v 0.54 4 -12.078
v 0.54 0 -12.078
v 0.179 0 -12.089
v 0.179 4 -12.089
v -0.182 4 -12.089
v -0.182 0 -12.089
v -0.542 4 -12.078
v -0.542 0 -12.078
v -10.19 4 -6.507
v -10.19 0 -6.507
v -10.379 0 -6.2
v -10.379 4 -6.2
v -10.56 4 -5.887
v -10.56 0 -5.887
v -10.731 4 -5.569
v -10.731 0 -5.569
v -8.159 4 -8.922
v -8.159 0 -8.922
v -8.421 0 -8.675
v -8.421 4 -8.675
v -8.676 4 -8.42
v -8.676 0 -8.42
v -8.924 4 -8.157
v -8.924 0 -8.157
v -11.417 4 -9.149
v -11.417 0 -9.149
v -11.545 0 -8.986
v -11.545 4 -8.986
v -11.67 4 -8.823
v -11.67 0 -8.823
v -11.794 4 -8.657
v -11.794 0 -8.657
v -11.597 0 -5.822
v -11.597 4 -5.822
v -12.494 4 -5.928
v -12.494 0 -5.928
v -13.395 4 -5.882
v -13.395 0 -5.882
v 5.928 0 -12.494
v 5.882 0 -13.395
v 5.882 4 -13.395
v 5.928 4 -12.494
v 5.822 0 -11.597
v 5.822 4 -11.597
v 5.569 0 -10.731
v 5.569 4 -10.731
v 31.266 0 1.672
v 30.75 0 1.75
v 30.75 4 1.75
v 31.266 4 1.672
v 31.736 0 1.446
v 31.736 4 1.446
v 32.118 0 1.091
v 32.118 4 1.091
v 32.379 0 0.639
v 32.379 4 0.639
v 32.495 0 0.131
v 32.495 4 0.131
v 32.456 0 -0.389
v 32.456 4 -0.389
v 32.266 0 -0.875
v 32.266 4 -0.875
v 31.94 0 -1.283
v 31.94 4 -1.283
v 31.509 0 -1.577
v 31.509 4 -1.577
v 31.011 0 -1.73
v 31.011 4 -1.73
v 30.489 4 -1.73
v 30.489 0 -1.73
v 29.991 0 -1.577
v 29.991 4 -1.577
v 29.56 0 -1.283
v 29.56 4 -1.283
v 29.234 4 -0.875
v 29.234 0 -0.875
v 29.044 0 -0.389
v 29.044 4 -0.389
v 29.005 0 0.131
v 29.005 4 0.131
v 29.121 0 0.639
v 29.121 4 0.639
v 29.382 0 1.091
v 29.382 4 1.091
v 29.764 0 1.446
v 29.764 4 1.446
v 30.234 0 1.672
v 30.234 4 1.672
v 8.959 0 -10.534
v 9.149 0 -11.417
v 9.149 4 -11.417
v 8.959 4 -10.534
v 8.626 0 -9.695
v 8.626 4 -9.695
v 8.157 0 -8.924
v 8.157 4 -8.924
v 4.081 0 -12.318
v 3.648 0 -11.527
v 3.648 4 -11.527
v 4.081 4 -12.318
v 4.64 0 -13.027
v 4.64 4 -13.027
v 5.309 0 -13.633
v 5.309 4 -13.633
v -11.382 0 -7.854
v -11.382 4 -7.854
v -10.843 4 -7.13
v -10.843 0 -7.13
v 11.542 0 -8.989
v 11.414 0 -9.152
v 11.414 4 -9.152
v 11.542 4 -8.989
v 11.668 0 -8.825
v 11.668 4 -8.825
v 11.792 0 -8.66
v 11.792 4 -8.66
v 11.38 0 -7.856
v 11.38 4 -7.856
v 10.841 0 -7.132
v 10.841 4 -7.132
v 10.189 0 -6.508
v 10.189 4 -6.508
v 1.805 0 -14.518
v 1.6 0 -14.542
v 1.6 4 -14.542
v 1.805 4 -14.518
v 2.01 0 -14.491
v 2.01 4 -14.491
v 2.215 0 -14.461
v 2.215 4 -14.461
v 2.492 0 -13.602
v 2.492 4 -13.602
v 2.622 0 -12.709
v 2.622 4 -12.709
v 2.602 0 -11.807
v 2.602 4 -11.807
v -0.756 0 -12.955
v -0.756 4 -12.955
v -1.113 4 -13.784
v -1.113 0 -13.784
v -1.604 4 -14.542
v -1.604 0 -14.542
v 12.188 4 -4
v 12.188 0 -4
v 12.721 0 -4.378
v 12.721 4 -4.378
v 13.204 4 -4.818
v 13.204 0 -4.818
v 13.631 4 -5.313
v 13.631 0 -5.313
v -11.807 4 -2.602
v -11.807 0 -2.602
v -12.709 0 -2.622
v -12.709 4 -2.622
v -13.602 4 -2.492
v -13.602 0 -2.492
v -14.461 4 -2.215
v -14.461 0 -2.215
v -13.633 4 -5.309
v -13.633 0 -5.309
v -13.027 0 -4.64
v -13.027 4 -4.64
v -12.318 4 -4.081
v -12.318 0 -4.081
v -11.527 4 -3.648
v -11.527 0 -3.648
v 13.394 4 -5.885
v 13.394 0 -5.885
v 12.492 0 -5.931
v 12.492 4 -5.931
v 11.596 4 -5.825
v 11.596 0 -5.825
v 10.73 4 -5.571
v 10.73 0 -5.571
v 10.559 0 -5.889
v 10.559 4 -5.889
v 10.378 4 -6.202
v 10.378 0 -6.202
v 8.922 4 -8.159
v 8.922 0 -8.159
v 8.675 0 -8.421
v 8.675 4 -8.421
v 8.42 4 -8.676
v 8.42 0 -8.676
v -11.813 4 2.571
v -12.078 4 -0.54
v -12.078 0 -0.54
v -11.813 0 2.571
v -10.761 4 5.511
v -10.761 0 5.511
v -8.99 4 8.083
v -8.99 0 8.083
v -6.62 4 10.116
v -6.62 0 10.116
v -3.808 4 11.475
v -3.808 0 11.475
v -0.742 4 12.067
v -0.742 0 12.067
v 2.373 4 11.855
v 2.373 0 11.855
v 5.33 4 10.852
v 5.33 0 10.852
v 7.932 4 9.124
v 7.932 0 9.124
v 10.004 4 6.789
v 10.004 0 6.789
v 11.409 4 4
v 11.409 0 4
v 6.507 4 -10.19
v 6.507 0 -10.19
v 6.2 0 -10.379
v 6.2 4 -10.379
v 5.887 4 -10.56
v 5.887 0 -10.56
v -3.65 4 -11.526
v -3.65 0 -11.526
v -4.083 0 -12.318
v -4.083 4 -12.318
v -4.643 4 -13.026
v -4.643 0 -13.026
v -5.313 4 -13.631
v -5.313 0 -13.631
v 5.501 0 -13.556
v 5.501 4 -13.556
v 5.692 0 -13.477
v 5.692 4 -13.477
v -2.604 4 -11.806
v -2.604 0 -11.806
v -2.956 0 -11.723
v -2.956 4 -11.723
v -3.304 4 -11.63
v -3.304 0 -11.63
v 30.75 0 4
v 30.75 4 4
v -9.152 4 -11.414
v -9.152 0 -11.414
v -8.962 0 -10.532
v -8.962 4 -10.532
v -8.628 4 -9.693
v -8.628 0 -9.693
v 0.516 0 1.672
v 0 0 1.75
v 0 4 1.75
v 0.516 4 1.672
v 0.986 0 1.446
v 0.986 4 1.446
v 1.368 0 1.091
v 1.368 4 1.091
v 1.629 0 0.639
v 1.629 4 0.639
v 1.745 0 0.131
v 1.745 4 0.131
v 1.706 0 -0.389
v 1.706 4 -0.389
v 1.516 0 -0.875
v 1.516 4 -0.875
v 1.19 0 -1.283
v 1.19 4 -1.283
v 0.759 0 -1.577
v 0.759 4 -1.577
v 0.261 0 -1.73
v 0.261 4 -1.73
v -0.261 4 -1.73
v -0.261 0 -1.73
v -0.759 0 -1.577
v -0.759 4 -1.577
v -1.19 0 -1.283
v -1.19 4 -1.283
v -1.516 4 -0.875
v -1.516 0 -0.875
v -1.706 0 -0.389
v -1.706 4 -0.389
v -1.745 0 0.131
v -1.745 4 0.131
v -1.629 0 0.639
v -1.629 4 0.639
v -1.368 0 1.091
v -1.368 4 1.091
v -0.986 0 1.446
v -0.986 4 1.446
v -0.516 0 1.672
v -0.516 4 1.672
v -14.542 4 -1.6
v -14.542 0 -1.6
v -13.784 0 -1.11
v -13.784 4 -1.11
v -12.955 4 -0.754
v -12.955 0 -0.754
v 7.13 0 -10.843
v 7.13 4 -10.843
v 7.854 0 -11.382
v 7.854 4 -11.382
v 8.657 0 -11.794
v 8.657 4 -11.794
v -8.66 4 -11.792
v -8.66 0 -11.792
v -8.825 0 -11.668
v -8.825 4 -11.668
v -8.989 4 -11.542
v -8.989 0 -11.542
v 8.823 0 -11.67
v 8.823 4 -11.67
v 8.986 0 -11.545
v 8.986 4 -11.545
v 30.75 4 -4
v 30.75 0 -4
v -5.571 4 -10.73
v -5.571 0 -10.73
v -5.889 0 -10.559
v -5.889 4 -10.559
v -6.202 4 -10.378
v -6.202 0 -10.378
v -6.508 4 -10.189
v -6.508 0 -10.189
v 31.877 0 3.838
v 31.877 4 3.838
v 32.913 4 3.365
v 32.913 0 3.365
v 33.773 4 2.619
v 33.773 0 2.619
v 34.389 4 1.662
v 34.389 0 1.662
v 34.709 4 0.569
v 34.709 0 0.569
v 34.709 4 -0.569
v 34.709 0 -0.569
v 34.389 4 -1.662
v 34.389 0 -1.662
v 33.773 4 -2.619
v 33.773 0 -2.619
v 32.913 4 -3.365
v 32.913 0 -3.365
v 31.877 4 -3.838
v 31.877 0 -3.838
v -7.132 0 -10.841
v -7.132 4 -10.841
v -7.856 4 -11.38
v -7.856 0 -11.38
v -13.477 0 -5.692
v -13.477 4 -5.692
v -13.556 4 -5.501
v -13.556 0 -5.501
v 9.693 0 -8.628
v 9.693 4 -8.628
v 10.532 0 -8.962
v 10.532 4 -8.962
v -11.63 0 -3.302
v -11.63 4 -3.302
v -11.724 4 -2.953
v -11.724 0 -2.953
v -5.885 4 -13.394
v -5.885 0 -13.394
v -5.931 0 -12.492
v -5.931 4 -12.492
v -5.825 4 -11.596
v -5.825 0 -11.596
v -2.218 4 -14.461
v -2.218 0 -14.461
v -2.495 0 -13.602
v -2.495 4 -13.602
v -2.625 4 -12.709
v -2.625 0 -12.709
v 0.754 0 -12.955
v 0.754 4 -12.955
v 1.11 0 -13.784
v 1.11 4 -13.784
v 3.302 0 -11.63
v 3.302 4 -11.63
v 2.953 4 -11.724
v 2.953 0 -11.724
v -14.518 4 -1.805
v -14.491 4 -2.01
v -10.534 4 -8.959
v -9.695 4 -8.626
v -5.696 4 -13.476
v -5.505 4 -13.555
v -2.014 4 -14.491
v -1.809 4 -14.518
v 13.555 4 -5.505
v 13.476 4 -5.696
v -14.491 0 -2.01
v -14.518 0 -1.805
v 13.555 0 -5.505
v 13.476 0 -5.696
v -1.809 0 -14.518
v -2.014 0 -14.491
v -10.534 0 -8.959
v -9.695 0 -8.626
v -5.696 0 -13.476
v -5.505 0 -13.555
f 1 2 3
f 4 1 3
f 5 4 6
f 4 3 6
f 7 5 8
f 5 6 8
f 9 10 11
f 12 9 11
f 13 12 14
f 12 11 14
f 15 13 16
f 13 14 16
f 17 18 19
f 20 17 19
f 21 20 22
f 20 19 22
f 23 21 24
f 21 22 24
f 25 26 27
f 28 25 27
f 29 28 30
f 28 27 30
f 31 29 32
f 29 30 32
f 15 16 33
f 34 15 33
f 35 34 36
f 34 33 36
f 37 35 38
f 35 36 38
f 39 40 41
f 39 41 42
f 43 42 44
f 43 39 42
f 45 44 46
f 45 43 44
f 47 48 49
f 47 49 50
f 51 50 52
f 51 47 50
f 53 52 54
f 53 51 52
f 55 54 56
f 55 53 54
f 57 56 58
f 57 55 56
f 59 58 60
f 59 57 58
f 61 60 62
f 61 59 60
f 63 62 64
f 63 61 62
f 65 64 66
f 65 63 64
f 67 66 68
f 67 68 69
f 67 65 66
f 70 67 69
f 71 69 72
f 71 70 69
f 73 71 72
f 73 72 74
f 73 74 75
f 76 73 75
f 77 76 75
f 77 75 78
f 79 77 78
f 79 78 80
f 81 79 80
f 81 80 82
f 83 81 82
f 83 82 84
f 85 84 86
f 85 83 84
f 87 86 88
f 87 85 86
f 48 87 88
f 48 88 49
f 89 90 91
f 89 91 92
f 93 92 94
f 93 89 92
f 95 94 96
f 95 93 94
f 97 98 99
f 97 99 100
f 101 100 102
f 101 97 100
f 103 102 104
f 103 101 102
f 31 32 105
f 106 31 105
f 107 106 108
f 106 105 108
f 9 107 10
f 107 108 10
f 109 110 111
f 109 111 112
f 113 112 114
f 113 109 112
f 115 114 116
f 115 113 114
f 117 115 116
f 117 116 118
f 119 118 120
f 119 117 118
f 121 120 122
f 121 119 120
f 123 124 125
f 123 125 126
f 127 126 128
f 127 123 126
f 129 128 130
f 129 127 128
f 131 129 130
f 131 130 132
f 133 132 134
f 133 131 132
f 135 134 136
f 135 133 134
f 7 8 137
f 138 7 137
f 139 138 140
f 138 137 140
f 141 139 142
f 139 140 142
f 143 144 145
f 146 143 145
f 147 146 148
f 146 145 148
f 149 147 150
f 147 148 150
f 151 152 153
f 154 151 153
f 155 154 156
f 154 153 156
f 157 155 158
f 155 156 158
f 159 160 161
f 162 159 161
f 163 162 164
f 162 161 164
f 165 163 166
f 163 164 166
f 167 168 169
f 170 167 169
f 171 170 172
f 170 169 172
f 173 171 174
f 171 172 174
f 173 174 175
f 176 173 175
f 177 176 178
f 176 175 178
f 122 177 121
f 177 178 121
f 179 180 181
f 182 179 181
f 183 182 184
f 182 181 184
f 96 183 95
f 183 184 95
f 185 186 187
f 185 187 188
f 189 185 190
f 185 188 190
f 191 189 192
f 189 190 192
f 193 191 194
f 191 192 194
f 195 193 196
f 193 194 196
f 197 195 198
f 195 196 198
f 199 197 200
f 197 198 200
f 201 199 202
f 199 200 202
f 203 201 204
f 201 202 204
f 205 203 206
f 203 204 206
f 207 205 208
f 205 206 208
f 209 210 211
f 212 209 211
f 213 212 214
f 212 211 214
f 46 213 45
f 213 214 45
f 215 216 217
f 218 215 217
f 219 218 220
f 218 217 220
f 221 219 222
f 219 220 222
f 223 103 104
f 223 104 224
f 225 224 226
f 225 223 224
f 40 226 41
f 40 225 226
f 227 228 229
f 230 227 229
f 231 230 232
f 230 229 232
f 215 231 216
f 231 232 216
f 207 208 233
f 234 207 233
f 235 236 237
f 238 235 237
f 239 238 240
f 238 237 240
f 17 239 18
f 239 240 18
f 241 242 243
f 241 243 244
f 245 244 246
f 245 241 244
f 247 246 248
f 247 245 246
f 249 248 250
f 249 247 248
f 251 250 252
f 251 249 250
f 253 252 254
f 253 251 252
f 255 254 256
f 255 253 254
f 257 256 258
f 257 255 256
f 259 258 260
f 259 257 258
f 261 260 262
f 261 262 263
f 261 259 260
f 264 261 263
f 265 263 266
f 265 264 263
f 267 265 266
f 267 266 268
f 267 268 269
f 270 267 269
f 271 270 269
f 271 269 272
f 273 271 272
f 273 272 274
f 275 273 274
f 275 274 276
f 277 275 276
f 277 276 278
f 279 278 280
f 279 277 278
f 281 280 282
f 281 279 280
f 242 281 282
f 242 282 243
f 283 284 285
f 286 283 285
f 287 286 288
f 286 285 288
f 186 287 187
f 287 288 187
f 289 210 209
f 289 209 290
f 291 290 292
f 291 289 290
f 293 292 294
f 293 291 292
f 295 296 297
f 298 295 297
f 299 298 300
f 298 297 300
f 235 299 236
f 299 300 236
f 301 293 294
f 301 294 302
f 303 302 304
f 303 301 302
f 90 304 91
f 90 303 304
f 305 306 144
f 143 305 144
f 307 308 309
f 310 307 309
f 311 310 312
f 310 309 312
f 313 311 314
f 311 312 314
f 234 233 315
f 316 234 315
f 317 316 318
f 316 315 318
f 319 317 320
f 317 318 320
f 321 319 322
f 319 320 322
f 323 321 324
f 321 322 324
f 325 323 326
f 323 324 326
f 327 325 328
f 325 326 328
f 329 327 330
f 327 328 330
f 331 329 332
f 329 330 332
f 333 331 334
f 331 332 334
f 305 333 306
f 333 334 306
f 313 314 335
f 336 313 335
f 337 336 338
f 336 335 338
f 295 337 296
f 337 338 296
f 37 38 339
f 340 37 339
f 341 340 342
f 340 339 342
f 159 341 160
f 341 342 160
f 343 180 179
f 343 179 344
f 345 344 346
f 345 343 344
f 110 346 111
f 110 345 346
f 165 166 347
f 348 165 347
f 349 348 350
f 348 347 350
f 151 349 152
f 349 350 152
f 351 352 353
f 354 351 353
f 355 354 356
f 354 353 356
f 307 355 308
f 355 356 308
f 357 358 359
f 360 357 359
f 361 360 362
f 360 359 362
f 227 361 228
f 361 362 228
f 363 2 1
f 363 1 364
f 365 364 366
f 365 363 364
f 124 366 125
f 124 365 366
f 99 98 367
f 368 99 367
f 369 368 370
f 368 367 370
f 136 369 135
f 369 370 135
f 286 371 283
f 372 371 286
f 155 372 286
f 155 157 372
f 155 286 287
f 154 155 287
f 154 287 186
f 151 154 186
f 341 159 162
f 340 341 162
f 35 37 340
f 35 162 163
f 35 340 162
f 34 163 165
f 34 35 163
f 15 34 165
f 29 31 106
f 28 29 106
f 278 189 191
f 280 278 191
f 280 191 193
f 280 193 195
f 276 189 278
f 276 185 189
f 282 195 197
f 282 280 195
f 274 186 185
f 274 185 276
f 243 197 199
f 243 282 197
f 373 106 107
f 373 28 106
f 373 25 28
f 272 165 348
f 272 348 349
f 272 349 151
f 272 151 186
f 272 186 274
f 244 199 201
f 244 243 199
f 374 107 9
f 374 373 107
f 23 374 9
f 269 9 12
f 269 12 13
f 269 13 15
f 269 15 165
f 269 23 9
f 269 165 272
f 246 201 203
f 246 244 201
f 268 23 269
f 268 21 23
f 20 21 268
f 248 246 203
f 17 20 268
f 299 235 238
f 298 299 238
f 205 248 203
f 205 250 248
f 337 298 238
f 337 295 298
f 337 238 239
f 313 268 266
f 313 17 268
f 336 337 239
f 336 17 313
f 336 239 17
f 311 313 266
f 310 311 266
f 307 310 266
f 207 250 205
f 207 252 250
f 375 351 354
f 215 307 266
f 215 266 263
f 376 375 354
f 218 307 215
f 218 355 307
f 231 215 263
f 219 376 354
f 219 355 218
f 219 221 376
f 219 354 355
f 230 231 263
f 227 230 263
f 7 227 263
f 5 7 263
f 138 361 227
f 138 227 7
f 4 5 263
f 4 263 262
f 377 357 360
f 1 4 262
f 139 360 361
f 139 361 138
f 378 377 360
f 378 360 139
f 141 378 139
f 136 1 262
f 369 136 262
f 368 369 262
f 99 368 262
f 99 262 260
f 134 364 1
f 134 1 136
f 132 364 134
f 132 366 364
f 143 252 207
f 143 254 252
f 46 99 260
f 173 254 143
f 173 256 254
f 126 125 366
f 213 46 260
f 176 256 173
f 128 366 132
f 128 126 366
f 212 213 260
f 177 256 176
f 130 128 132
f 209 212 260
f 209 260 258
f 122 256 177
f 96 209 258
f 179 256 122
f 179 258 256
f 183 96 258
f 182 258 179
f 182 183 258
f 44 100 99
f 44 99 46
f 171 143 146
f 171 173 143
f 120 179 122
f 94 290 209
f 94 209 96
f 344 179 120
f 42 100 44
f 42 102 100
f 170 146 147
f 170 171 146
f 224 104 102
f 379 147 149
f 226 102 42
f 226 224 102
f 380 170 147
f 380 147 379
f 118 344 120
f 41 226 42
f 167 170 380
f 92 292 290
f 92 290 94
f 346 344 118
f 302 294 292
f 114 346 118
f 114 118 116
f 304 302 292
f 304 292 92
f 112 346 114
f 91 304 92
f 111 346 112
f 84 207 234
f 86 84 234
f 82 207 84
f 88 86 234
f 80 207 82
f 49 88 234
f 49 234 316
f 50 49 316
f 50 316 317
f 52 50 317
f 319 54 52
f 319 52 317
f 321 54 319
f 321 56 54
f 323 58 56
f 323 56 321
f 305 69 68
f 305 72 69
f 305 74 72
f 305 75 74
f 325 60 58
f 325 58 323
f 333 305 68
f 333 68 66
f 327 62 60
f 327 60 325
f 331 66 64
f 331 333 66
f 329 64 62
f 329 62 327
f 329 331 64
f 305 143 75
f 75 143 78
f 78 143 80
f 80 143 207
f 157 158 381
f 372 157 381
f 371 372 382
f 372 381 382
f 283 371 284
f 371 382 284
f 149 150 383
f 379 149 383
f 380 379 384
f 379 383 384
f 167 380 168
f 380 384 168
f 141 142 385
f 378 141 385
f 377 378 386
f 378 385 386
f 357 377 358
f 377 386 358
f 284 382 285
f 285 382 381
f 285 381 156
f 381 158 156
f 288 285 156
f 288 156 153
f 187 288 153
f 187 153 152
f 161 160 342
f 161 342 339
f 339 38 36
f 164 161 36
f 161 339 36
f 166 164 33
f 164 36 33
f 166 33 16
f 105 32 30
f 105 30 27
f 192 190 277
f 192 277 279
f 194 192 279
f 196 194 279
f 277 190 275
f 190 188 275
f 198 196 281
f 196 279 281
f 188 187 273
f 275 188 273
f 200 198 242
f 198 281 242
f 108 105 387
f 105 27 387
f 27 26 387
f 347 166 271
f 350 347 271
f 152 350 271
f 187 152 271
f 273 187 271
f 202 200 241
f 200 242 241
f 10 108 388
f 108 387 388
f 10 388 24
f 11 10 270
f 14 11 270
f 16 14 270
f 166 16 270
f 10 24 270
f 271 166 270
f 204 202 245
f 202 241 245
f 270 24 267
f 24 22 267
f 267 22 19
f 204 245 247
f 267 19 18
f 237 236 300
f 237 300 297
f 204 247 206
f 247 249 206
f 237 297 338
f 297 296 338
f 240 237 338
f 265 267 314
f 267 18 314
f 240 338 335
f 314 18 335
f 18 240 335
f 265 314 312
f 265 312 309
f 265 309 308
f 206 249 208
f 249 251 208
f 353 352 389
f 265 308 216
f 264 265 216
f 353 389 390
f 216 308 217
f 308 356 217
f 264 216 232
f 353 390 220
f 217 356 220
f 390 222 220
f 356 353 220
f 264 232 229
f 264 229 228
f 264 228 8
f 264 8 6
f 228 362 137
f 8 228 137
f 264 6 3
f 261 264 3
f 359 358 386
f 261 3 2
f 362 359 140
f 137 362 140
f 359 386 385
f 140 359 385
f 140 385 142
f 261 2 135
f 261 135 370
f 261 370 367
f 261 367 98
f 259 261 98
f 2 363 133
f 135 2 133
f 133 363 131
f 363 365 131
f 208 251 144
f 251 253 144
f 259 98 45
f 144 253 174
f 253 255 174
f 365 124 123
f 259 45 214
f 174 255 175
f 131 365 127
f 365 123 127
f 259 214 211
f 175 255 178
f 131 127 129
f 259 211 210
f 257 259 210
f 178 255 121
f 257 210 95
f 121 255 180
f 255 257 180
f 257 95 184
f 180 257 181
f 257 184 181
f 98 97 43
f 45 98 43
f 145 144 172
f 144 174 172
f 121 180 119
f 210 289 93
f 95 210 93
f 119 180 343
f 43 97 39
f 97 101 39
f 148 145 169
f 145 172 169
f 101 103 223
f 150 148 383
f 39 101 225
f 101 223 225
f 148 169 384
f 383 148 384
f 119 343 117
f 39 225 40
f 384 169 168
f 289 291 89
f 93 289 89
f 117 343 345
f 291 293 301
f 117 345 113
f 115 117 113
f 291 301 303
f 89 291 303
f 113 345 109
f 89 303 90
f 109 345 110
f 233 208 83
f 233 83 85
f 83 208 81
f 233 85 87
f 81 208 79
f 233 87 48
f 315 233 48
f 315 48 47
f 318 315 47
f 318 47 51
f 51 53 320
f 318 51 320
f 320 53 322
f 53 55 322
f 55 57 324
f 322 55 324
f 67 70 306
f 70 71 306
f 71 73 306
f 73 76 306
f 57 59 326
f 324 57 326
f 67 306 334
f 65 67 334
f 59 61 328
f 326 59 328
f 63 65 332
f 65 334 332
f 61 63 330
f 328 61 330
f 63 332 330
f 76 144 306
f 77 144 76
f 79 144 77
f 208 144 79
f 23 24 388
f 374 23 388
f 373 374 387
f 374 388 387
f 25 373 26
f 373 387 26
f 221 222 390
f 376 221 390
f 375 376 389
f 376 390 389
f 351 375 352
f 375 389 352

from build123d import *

# Parameters (mm, degrees)
SKETCH1_R           = 1.75
BOSS_EXTRUDE1_DEPTH = 4
BOSS_EXTRUDE2_START = -4
BOSS_EXTRUDE2_DEPTH = 4


with BuildPart() as part:
    # Sketch1 → Boss-Extrude1 (new body)
    with BuildSketch(Plane(origin=(0, 0, 0), x_dir=(1, 0, 0), z_dir=(0, 1, 0))):
        with BuildLine():
            Line((30.75, 4), (11.409123542, 4))
            ThreePointArc((11.409123542, 4), (-12.09, 0), (11.409123542, -4))
            Line((11.409123542, -4), (30.75, -4))
            ThreePointArc((30.75, -4), (34.75, 0), (30.75, 4))
        make_face()
        with Locations(Location((30.75, 0, 0), (0, 0, 270))):
            Circle(SKETCH1_R, mode=Mode.SUBTRACT)
        with Locations(Location((0, 0, 0), (0, 0, 270))):
            Circle(SKETCH1_R, mode=Mode.SUBTRACT)
    extrude(amount=BOSS_EXTRUDE1_DEPTH)

    # Sketch2 → Boss-Extrude2 (add)
    with BuildSketch(Plane(origin=(0, 4, 0), x_dir=(1, 0, 0), z_dir=(0, 1, 0)).offset(BOSS_EXTRUDE2_START)):
        with BuildLine():
            ThreePointArc((13.631289382, 5.312706446), (13.515656169, 5.600351625), (13.393953907, 5.885482032))
            ThreePointArc((13.393953907, 5.885482032), (12.042056289, 5.896469103), (10.729798038, 5.571313495))
            ThreePointArc((10.729798038, 5.571313495), (11.16927846, 4.627668819), (11.525956115, 3.649717201))
            ThreePointArc((11.525956115, 3.649717201), (12.683545875, 4.348379847), (13.631289382, 5.312706446))
        make_face()
        with BuildLine():
            ThreePointArc((0.54, 12.077934426), (0.914536108, 13.376961211), (1.6, 14.542245356))
            ThreePointArc((1.6, 14.542245356), (1.907781307, 14.505077404), (2.214705946, 14.461396114))
            ThreePointArc((2.214705946, 14.461396114), (2.575965524, 13.158462861), (2.602230245, 11.806629399))
            ThreePointArc((2.602230245, 11.806629399), (1.576960473, 11.986713297), (0.54, 12.077934426))
        make_face()
        with BuildLine():
            ThreePointArc((5.882126404, 13.395427913), (5.89385242, 12.043390174), (5.569341946, 10.73082151))
            ThreePointArc((5.569341946, 10.73082151), (4.625616537, 11.170128542), (3.647599401, 11.526626506))
            ThreePointArc((3.647599401, 11.526626506), (4.345586373, 12.684452949), (5.309291379, 13.63261989))
            ThreePointArc((5.309291379, 13.63261989), (5.596965518, 13.51705874), (5.882126404, 13.395427913))
        make_face()
        with BuildLine():
            ThreePointArc((9.148689668, 11.416583436), (8.810083014, 10.10758035), (8.156912198, 8.92372587))
            ThreePointArc((8.156912198, 8.92372587), (7.359044479, 9.592317987), (6.506620931, 10.189798038))
            ThreePointArc((6.506620931, 10.189798038), (7.480492108, 11.12752018), (8.656763324, 11.793953907))
            ThreePointArc((8.656763324, 11.793953907), (8.904725778, 11.607874862), (9.148689668, 11.416583436))
        make_face()
        with BuildLine():
            ThreePointArc((11.791784851, 8.659717665), (11.125921009, 7.482955629), (10.188602363, 6.508493058))
            ThreePointArc((10.188602363, 6.508493058), (9.5909657, 7.360806813), (8.922226997, 8.158551674))
            ThreePointArc((8.922226997, 8.158551674), (10.105614668, 8.8122653), (11.414291155, 9.151549455))
            ThreePointArc((11.414291155, 9.151549455), (11.605643693, 8.907633495), (11.791784851, 8.659717665))
        make_face()
        with BuildLine():
            ThreePointArc((-1.603643062, 14.541844069), (-1.911415048, 14.504599013), (-2.218328735, 14.460840834))
            ThreePointArc((-2.218328735, 14.460840834), (-2.578838281, 13.157851673), (-2.604399509, 11.806151075))
            ThreePointArc((-2.604399509, 11.806151075), (-1.579162842, 11.98642335), (-0.542219148, 12.077835005))
            ThreePointArc((-0.542219148, 12.077835005), (-0.917469165, 13.376808049), (-1.603643062, 14.541844069))
        make_face()
        with BuildLine():
            ThreePointArc((-5.312706446, 13.631289382), (-5.600351625, 13.515656169), (-5.885482032, 13.393953907))
            ThreePointArc((-5.885482032, 13.393953907), (-5.896469103, 12.042056289), (-5.571313495, 10.729798038))
            ThreePointArc((-5.571313495, 10.729798038), (-4.627668819, 11.16927846), (-3.649717201, 11.525956115))
            ThreePointArc((-3.649717201, 11.525956115), (-4.348379847, 12.683545875), (-5.312706446, 13.631289382))
        make_face()
        with BuildLine():
            ThreePointArc((-8.659717665, 11.791784851), (-8.907633495, 11.605643693), (-9.151549455, 11.414291155))
            ThreePointArc((-9.151549455, 11.414291155), (-8.8122653, 10.105614668), (-8.158551674, 8.922226997))
            ThreePointArc((-8.158551674, 8.922226997), (-7.360806813, 9.5909657), (-6.508493058, 10.188602363))
            ThreePointArc((-6.508493058, 10.188602363), (-7.482955629, 11.125921009), (-8.659717665, 11.791784851))
        make_face()
        with BuildLine():
            ThreePointArc((-11.416583436, 9.148689668), (-11.607874862, 8.904725778), (-11.793953907, 8.656763324))
            ThreePointArc((-11.793953907, 8.656763324), (-11.12752018, 7.480492108), (-10.189798038, 6.506620931))
            ThreePointArc((-10.189798038, 6.506620931), (-9.592317987, 7.359044479), (-8.92372587, 8.156912198))
            ThreePointArc((-8.92372587, 8.156912198), (-10.10758035, 8.810083014), (-11.416583436, 9.148689668))
        make_face()
        with BuildLine():
            ThreePointArc((-13.395427913, 5.882126404), (-13.51705874, 5.596965518), (-13.63261989, 5.309291379))
            ThreePointArc((-13.63261989, 5.309291379), (-12.684452949, 4.345586373), (-11.526626506, 3.647599401))
            ThreePointArc((-11.526626506, 3.647599401), (-11.170128542, 4.625616537), (-10.73082151, 5.569341946))
            ThreePointArc((-10.73082151, 5.569341946), (-12.043390174, 5.89385242), (-13.395427913, 5.882126404))
        make_face()
        with BuildLine():
            ThreePointArc((-14.461396114, 2.214705946), (-14.505077404, 1.907781307), (-14.542245356, 1.6))
            ThreePointArc((-14.542245356, 1.6), (-13.376961211, 0.914536108), (-12.077934426, 0.54))
            ThreePointArc((-12.077934426, 0.54), (-11.986713297, 1.576960473), (-11.806629399, 2.602230245))
            ThreePointArc((-11.806629399, 2.602230245), (-13.158462861, 2.575965524), (-14.461396114, 2.214705946))
        make_face()
    extrude(amount=BOSS_EXTRUDE2_DEPTH)


solid = part.part
